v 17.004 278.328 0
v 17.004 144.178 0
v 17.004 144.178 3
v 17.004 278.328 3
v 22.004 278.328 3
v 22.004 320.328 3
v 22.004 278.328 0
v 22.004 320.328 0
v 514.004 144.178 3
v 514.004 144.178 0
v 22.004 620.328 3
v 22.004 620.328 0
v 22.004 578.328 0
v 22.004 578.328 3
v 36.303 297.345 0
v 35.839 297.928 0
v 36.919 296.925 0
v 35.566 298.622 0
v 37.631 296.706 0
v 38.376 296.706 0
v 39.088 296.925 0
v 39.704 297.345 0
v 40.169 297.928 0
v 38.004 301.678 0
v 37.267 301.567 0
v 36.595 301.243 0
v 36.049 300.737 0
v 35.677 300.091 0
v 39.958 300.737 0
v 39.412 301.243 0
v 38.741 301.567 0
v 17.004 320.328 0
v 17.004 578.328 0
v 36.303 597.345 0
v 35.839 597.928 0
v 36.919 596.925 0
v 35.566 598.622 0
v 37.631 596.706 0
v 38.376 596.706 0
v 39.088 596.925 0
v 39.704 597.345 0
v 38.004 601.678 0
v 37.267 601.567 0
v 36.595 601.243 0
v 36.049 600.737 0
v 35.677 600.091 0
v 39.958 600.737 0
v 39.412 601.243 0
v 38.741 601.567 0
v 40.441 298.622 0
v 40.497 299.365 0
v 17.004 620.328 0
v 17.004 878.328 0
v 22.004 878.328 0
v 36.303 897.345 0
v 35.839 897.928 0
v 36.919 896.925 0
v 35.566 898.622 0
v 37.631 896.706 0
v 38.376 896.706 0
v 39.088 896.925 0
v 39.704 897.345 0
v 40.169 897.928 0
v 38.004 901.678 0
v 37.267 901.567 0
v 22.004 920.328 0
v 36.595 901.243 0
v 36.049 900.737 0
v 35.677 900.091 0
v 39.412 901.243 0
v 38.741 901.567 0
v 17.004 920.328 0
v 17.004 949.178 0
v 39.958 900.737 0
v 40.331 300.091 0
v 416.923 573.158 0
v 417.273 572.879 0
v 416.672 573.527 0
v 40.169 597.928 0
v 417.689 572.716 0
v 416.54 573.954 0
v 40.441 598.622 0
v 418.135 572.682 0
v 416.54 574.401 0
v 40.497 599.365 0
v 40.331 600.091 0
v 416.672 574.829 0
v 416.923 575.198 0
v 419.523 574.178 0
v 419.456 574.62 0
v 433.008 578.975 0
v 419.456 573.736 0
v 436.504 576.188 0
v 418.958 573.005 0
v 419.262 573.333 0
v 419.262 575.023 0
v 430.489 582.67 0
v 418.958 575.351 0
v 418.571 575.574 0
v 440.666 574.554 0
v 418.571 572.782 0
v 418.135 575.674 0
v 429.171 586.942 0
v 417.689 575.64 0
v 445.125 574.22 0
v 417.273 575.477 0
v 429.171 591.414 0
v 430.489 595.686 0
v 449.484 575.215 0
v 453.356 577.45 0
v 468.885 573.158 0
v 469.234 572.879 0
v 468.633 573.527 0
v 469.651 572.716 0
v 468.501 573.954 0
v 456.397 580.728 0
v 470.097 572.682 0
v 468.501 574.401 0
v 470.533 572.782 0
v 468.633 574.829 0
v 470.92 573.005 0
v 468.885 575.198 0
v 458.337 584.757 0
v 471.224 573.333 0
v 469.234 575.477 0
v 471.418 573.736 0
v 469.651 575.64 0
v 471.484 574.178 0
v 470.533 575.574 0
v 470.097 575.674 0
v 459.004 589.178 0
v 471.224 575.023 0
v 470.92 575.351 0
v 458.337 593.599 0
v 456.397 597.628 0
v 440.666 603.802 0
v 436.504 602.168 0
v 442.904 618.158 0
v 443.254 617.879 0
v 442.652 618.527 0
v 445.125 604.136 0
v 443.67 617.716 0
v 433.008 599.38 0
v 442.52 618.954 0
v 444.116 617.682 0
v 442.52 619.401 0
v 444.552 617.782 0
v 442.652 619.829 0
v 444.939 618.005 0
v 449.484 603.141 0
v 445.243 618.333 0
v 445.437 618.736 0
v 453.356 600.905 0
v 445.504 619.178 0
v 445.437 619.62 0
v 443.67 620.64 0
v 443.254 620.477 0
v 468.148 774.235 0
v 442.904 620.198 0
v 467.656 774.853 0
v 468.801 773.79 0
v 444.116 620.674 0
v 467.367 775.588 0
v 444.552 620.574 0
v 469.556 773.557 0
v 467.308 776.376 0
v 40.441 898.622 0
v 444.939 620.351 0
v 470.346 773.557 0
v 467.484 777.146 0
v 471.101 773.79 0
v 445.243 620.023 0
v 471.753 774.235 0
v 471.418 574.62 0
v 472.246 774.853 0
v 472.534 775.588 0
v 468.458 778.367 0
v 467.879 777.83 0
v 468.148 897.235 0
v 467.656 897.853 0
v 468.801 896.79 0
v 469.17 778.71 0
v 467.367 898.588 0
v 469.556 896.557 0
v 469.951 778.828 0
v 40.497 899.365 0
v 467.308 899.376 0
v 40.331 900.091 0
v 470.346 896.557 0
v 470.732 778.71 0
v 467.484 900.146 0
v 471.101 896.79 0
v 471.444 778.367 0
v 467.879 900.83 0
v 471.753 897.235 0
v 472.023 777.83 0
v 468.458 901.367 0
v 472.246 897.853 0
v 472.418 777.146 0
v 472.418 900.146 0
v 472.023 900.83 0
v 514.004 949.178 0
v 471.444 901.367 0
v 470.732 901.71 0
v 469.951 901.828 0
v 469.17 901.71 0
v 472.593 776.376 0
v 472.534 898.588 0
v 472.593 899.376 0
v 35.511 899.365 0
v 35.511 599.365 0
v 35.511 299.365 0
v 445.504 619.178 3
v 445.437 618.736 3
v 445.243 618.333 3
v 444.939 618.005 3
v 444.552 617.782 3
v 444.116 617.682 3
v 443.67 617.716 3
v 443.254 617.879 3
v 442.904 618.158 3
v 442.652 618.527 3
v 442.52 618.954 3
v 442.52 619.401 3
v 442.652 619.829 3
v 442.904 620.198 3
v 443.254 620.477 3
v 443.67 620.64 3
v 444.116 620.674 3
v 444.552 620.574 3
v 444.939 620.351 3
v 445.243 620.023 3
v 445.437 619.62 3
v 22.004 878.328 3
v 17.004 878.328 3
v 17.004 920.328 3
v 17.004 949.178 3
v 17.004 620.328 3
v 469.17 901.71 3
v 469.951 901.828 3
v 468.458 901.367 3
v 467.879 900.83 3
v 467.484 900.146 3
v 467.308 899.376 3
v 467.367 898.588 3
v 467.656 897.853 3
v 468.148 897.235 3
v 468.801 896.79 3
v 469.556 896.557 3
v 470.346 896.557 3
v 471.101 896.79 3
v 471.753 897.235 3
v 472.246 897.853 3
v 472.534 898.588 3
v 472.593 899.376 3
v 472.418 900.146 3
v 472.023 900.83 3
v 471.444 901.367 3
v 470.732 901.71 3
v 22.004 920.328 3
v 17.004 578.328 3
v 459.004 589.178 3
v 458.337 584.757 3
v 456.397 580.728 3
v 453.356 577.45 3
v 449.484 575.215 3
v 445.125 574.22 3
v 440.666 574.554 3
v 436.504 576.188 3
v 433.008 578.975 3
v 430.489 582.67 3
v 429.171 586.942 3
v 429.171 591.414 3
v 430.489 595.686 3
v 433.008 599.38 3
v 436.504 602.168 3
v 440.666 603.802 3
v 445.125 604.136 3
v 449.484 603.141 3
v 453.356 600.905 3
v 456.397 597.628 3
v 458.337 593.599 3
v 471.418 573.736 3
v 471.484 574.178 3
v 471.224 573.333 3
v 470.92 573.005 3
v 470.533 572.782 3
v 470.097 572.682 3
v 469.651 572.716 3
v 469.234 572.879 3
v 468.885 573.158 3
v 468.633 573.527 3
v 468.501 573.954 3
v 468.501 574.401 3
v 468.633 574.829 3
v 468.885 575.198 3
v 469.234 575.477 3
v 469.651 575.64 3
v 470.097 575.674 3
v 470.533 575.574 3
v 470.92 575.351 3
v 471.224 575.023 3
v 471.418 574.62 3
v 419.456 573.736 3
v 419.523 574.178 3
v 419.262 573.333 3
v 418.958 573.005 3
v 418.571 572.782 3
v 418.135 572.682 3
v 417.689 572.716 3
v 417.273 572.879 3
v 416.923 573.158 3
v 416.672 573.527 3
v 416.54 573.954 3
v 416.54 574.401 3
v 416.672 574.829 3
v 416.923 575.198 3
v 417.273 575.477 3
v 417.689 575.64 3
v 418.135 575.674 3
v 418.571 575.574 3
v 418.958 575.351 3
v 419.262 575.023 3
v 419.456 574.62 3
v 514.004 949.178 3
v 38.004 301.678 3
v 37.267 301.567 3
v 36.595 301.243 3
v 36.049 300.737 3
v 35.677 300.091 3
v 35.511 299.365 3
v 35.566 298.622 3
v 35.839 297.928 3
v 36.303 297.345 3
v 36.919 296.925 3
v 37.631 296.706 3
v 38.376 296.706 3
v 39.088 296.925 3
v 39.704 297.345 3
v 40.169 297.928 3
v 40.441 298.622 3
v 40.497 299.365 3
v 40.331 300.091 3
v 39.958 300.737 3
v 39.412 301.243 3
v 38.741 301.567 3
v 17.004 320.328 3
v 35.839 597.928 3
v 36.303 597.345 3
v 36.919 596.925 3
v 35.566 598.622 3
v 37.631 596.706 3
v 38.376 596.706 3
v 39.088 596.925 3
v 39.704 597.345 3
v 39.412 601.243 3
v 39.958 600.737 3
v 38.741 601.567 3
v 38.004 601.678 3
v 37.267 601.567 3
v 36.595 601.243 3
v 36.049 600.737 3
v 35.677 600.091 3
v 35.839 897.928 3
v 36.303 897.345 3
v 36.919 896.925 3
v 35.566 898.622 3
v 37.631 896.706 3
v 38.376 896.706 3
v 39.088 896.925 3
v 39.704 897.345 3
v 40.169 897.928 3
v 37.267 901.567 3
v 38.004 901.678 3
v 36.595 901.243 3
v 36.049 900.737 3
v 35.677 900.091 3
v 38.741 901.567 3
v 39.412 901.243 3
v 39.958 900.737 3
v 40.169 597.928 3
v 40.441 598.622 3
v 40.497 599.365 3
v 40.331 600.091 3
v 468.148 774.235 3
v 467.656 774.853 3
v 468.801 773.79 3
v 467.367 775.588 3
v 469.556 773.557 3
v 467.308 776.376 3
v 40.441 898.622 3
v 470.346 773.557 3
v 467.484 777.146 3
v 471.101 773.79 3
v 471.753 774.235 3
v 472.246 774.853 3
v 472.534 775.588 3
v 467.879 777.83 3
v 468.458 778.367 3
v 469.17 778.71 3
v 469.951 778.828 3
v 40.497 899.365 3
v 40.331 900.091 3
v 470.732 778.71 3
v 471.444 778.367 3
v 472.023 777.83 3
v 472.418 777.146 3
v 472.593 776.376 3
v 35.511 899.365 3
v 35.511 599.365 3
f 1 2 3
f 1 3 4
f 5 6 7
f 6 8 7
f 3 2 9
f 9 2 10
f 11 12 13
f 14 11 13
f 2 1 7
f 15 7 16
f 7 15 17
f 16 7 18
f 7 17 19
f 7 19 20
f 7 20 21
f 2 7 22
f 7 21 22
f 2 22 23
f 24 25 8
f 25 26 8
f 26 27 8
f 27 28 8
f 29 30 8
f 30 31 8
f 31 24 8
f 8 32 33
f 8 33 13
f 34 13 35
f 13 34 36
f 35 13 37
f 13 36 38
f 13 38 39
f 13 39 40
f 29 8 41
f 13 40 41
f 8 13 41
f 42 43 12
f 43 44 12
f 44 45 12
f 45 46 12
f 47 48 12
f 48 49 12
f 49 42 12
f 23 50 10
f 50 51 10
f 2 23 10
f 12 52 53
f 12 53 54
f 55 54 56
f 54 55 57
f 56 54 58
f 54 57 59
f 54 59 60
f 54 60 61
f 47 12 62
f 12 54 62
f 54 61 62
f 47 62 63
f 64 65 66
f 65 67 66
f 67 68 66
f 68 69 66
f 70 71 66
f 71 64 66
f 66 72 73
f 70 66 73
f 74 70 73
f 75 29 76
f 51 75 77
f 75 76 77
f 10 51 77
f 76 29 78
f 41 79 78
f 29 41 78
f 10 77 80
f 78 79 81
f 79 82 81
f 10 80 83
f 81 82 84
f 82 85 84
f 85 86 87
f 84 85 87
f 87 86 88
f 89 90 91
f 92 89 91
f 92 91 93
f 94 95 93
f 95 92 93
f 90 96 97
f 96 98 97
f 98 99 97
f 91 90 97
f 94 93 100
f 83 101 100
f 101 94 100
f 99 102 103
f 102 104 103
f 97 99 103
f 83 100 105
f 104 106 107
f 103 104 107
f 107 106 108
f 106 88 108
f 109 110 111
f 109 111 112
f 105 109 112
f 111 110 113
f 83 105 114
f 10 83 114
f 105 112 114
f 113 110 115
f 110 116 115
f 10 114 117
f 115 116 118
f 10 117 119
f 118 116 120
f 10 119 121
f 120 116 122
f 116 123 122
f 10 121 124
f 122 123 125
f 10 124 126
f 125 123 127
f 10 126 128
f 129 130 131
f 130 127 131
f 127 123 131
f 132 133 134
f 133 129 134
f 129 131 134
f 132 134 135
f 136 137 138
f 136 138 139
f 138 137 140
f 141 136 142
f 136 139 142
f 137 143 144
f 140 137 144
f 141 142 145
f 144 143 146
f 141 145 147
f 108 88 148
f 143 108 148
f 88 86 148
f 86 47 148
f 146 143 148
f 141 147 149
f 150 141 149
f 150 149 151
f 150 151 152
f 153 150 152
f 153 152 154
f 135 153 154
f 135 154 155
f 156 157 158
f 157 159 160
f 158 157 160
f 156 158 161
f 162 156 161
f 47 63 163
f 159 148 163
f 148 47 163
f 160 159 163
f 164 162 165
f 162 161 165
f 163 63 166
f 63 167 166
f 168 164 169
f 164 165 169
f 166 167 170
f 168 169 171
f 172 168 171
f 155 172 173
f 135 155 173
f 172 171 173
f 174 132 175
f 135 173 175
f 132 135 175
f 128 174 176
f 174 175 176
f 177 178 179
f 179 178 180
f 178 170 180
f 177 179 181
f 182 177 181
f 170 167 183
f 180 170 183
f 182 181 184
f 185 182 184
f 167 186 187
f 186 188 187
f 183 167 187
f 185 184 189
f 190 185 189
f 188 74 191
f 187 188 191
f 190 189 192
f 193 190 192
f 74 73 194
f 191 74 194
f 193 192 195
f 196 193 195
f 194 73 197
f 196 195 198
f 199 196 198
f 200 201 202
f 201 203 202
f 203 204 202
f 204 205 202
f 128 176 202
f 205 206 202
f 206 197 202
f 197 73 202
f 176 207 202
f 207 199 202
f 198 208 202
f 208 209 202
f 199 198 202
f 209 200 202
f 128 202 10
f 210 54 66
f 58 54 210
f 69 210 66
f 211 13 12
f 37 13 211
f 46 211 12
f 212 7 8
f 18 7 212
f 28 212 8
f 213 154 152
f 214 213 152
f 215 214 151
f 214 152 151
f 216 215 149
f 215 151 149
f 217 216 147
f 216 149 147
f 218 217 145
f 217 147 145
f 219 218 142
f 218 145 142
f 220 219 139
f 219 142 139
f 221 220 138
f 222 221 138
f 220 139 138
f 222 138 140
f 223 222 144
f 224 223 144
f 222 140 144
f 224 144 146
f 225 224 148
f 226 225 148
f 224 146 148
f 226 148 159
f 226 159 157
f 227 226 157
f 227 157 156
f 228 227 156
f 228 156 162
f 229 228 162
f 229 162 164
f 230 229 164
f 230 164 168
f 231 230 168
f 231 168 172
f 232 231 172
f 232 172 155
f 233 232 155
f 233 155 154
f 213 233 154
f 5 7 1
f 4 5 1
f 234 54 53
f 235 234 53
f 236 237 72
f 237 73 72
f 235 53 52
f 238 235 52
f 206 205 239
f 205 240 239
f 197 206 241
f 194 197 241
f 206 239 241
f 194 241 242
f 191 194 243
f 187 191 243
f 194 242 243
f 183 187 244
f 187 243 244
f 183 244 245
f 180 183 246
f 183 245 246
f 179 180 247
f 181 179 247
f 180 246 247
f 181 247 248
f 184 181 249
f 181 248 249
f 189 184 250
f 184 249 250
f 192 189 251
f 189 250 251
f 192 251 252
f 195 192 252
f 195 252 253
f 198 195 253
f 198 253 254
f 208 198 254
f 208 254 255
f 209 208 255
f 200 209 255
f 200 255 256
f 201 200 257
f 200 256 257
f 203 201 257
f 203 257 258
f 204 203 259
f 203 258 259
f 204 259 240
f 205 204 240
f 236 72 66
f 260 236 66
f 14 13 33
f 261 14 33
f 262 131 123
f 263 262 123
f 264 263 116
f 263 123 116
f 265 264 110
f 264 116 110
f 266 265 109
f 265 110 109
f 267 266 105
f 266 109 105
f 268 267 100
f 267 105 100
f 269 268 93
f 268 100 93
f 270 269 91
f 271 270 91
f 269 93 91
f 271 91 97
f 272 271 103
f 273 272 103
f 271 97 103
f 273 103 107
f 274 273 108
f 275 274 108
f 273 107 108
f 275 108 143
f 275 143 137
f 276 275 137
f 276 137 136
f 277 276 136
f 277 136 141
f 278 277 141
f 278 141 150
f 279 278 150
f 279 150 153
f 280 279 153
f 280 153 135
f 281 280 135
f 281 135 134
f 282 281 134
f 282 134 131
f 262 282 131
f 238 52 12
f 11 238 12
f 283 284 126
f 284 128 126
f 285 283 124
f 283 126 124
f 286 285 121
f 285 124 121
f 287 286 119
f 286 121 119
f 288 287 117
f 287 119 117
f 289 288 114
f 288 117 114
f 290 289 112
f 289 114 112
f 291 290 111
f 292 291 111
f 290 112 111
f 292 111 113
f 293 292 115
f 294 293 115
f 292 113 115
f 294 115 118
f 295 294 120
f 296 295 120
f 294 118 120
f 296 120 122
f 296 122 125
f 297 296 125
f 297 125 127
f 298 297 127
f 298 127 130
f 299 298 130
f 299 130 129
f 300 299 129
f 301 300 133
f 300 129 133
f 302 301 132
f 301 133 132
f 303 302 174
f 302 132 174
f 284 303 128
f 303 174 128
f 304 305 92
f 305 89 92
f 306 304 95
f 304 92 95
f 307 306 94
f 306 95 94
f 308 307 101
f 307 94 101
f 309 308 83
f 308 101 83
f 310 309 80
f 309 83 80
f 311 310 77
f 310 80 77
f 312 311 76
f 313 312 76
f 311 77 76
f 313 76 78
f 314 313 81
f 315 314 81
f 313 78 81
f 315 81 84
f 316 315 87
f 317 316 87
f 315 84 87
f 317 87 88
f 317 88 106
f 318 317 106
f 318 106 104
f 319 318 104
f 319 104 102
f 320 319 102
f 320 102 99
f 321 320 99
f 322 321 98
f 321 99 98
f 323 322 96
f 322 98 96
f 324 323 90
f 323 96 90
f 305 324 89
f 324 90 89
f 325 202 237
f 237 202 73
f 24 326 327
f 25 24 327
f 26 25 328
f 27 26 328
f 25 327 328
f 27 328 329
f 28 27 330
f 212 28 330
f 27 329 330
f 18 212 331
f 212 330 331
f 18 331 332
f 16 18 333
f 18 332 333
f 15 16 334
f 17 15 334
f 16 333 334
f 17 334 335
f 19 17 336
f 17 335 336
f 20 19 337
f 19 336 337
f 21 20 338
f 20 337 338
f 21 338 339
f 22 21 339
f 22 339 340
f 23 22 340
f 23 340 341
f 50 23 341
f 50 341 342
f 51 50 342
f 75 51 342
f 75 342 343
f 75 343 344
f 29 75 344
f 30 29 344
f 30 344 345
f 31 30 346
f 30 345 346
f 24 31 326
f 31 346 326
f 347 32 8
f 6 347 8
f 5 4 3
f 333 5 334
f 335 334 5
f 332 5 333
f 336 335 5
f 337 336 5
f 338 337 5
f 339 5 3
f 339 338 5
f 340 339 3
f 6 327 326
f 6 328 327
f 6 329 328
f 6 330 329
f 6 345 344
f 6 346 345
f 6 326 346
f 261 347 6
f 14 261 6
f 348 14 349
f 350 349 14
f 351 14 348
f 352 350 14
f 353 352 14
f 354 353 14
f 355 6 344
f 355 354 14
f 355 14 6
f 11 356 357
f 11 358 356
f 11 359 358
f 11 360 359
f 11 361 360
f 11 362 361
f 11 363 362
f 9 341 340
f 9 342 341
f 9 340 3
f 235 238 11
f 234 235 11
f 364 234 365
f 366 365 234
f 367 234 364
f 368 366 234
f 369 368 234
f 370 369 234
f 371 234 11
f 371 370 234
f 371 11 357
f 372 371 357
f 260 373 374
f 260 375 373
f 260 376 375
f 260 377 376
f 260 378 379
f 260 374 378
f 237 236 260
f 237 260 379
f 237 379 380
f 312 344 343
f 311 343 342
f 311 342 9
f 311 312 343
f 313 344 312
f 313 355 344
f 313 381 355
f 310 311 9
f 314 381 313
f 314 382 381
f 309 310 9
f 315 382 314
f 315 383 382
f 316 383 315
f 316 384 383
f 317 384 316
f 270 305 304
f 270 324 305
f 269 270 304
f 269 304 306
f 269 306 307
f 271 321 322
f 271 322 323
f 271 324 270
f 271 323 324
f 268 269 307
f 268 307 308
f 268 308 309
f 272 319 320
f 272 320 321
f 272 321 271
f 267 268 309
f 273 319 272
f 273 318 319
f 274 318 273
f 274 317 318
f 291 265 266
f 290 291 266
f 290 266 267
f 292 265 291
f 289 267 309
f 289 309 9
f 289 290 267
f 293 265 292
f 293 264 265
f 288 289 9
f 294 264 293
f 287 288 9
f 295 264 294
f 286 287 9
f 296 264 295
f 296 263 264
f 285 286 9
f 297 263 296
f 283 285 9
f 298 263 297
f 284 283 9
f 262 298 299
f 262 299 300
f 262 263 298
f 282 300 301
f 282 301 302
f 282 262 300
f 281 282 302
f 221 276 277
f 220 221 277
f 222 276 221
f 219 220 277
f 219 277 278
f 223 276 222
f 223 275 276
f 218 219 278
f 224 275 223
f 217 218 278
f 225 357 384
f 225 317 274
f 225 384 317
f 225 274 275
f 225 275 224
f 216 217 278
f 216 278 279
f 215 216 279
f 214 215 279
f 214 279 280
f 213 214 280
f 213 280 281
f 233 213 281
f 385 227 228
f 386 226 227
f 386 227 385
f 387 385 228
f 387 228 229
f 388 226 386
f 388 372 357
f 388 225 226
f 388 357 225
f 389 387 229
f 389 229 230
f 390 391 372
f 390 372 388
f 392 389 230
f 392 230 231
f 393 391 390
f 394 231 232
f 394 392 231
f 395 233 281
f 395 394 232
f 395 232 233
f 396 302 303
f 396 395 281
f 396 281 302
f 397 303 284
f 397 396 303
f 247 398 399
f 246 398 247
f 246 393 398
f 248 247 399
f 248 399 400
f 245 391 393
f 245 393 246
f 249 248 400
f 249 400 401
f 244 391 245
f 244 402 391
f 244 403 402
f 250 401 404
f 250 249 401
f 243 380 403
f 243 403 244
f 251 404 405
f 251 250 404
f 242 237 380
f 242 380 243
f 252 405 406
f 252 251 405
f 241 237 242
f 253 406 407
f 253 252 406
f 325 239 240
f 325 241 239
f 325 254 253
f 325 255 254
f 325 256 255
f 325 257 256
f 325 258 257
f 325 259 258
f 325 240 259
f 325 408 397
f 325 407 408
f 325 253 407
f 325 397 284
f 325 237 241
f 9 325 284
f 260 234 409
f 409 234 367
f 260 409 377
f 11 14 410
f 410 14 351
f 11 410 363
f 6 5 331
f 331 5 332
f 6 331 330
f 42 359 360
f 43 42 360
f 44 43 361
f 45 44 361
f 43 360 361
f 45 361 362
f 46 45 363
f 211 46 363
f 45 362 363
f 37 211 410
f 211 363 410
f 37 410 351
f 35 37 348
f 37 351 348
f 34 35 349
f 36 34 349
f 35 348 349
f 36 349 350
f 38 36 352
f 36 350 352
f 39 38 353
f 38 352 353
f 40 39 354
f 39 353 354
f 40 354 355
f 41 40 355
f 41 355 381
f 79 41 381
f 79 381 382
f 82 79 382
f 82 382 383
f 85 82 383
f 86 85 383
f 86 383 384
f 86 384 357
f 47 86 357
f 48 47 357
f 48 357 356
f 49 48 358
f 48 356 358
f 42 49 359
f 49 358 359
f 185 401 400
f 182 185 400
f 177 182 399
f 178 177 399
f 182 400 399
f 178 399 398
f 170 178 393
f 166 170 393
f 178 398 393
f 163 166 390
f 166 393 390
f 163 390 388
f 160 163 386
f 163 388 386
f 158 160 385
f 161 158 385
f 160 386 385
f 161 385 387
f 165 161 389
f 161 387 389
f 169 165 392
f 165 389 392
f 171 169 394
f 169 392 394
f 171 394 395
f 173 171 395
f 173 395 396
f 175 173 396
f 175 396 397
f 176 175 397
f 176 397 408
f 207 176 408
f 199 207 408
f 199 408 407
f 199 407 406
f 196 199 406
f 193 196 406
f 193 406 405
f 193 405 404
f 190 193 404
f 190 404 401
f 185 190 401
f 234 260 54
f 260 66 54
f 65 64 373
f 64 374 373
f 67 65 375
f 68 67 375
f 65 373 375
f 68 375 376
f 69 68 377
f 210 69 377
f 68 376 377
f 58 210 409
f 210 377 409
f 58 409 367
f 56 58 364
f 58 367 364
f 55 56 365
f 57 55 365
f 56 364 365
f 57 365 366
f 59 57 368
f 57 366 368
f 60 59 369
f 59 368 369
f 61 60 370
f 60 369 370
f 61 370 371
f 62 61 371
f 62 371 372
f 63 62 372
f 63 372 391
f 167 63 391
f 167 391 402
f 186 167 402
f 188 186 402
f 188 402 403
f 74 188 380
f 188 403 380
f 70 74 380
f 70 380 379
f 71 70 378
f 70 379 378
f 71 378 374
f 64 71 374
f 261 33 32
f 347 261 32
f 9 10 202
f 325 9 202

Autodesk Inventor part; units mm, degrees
ref_plane "YZ Plane" through (0, 0, 0) normal (1, 0, 0) x (0, 1, 0)
ref_plane "XZ Plane" through (0, 0, 0) normal (0, 1, 0) x (-1, 0, 0)
ref_plane "XY Plane" through (0, 0, 0) normal (0, 0, 1) x (1, 0, 0)
sketch "Sketch1" plane through (0, 0, 0) normal (0, 0, 1) x (1, 0, 0)
  line L0 (17.0037, 144.1779) -> (514.0037, 144.1779)
  line L1 (514.0037, 144.1779) -> (514.0037, 949.1779)
  line L2 (514.0037, 949.1779) -> (17.0037, 949.1779)
  circle A0 centre (469.9509, 776.1779) radius 2.65
  circle A1 centre (469.9509, 899.1779) radius 2.65
  circle A2 centre (444.0037, 589.1779) radius 15
  circle A3 centre (444.0037, 619.1779) radius 1.5
  circle A4 centre (418.023, 574.1779) radius 1.5
  circle A5 centre (469.9845, 574.1779) radius 1.5
  line L3 (444.0037, 589.1779) -> (444.0037, 619.1779) construction
  line L4 (444.0037, 589.1779) -> (444.0037, 619.1779) construction
  line L5 (444.0037, 589.1779) -> (444.0037, 619.1779) construction
  line L6 (444.0037, 589.1779) -> (444.0037, 619.1779) construction
  line L7 (17.0037, 949.1779) -> (17.0037, 920.3279)
  line L8 (17.0037, 920.3279) -> (22.0037, 920.3279)
  line L9 (22.0037, 920.3279) -> (22.0037, 878.3279)
  line L10 (22.0037, 878.3279) -> (17.0037, 878.3279)
  line L11 (17.0037, 878.3279) -> (17.0037, 620.3279)
  line L12 (17.0037, 620.3279) -> (22.0037, 620.3279)
  line L13 (22.0037, 620.3279) -> (22.0037, 578.3279)
  line L14 (22.0037, 578.3279) -> (17.0037, 578.3279)
  line L15 (17.0037, 578.3279) -> (17.0037, 320.3279)
  line L16 (17.0037, 320.3279) -> (22.0037, 320.3279)
  line L17 (22.0037, 320.3279) -> (22.0037, 278.3279)
  line L18 (22.0037, 278.3279) -> (17.0037, 278.3279)
  line L19 (17.0037, 144.1779) -> (17.0037, 278.3279)
  line L20 (35.5037, 901.6779) -> (38.0037, 901.6779)
  line L21 (35.5037, 896.6779) -> (38.0037, 896.6779)
  arc A6 (35.5037, 901.6779) -> (35.5037, 896.6779) centre (35.5037, 899.1779) ccw
  arc A7 (38.0037, 896.6779) -> (38.0037, 901.6779) centre (38.0037, 899.1779) ccw
  line L22 (35.5037, 601.6779) -> (38.0037, 601.6779)
  line L23 (35.5037, 596.6779) -> (38.0037, 596.6779)
  line L24 (35.5037, 301.6779) -> (38.0037, 301.6779)
  line L25 (35.5037, 296.6779) -> (38.0037, 296.6779)
  arc A8 (35.5037, 301.6779) -> (35.5037, 296.6779) centre (35.5037, 299.1779) ccw
  arc A9 (38.0037, 296.6779) -> (38.0037, 301.6779) centre (38.0037, 299.1779) ccw
  arc A10 (35.5037, 601.6779) -> (35.5037, 596.6779) centre (35.5037, 599.1779) ccw
  arc A11 (38.0037, 596.6779) -> (38.0037, 601.6779) centre (38.0037, 599.1779) ccw
  dimension "d72" = 497
  dimension "d73" = 805
  dimension "d85" = 50
  dimension "d133" = 5.3
  dimension "d134" = 5.3
  dimension "d135" = 123
  dimension "d168" = 50
  dimension "d218" = 30
  dimension "d219" = 70
  dimension "d221" = 3
  dimension "d222" = 3
  dimension "d223" = 3
  dimension "d224" = 30
  dimension "d228" = 15
  dimension "d230" = 15
  dimension "d231" = 25.9808
  dimension "d232" = 25.9808
  dimension "d233" = 360
  dimension "d248" = 300
  dimension "d249" = 300
  dimension "d250" = 28.85
  dimension "d251" = 5
  dimension "d252" = 42
  dimension "d253" = 90
  dimension "d254" = 5
  dimension "d255" = 90
  dimension "d256" = 21
  dimension "d257" = 5
  dimension "d258" = 42
  dimension "d259" = 5
  dimension "d260" = 90
  dimension "d261" = 5
  dimension "d262" = 90
  dimension "d263" = 42
  dimension "d264" = 90
  dimension "d265" = 5
  dimension "d266" = 90
  dimension "d268" = 258
  dimension "d269" = 258
  dimension "d270" = 2.5
  dimension "d271" = 5
  dimension "d272" = 7.5
  dimension "d273" = 5
  dimension "d274" = 7.5
  dimension "d275" = 2.5
  dimension "d276" = 7.5
  dimension "d277" = 2.5
  dimension "d278" = 5
extrude "Extrusion2" add sketch "Sketch1" along normal blind 3 contours L19 L18 L17 L16 L15 L14 L13 L12 L11 L10 L9 L8 L7 L2 L1 L0 | A0 | A1 | A2 | A3 | A4 | A5 | L20 A7 L21 A6 | L22 A11 L23 A10 | L24 A9 L25 A8
hole "Hole7" at (38.0037, 899.1779, 0) direction (0, 0, 1) diameter 5 end through all
hole "Hole8" at (38.0037, 599.1779, 0) direction (0, 0, 1) diameter 5 end through all
hole "Hole9" at (38.0037, 299.1779, 0) direction (0, 0, 1) diameter 5 end through all
hole "Hole13" at (469.9509, 776.1779, 0) direction (0, 0, 1) diameter 5.3 end through all
hole "Hole14" at (469.9509, 899.1779, 0) direction (0, 0, 1) diameter 5.3 end through all
extrude "Extrusion7" cut sketch "Sketch1" along normal blind 10 contours A2
extrude "Extrusion8" cut sketch "Sketch1" along normal blind 10 contours A3
extrude "Extrusion9" cut sketch "Sketch1" along normal blind 10 contours A4
extrude "Extrusion10" cut sketch "Sketch1" along normal blind 10 contours A5
equation "\"d91\" = d81"
equation "\"d98\" = d81"
equation "\"d105\" = d81"
equation "\"d137\" = d133"
equation "\"d144\" = d133"
equation "\"d81\" = 5"
properties part number "Plexiglas_Einfassung_550x710mm" material "Polycarbonate, Clear"
